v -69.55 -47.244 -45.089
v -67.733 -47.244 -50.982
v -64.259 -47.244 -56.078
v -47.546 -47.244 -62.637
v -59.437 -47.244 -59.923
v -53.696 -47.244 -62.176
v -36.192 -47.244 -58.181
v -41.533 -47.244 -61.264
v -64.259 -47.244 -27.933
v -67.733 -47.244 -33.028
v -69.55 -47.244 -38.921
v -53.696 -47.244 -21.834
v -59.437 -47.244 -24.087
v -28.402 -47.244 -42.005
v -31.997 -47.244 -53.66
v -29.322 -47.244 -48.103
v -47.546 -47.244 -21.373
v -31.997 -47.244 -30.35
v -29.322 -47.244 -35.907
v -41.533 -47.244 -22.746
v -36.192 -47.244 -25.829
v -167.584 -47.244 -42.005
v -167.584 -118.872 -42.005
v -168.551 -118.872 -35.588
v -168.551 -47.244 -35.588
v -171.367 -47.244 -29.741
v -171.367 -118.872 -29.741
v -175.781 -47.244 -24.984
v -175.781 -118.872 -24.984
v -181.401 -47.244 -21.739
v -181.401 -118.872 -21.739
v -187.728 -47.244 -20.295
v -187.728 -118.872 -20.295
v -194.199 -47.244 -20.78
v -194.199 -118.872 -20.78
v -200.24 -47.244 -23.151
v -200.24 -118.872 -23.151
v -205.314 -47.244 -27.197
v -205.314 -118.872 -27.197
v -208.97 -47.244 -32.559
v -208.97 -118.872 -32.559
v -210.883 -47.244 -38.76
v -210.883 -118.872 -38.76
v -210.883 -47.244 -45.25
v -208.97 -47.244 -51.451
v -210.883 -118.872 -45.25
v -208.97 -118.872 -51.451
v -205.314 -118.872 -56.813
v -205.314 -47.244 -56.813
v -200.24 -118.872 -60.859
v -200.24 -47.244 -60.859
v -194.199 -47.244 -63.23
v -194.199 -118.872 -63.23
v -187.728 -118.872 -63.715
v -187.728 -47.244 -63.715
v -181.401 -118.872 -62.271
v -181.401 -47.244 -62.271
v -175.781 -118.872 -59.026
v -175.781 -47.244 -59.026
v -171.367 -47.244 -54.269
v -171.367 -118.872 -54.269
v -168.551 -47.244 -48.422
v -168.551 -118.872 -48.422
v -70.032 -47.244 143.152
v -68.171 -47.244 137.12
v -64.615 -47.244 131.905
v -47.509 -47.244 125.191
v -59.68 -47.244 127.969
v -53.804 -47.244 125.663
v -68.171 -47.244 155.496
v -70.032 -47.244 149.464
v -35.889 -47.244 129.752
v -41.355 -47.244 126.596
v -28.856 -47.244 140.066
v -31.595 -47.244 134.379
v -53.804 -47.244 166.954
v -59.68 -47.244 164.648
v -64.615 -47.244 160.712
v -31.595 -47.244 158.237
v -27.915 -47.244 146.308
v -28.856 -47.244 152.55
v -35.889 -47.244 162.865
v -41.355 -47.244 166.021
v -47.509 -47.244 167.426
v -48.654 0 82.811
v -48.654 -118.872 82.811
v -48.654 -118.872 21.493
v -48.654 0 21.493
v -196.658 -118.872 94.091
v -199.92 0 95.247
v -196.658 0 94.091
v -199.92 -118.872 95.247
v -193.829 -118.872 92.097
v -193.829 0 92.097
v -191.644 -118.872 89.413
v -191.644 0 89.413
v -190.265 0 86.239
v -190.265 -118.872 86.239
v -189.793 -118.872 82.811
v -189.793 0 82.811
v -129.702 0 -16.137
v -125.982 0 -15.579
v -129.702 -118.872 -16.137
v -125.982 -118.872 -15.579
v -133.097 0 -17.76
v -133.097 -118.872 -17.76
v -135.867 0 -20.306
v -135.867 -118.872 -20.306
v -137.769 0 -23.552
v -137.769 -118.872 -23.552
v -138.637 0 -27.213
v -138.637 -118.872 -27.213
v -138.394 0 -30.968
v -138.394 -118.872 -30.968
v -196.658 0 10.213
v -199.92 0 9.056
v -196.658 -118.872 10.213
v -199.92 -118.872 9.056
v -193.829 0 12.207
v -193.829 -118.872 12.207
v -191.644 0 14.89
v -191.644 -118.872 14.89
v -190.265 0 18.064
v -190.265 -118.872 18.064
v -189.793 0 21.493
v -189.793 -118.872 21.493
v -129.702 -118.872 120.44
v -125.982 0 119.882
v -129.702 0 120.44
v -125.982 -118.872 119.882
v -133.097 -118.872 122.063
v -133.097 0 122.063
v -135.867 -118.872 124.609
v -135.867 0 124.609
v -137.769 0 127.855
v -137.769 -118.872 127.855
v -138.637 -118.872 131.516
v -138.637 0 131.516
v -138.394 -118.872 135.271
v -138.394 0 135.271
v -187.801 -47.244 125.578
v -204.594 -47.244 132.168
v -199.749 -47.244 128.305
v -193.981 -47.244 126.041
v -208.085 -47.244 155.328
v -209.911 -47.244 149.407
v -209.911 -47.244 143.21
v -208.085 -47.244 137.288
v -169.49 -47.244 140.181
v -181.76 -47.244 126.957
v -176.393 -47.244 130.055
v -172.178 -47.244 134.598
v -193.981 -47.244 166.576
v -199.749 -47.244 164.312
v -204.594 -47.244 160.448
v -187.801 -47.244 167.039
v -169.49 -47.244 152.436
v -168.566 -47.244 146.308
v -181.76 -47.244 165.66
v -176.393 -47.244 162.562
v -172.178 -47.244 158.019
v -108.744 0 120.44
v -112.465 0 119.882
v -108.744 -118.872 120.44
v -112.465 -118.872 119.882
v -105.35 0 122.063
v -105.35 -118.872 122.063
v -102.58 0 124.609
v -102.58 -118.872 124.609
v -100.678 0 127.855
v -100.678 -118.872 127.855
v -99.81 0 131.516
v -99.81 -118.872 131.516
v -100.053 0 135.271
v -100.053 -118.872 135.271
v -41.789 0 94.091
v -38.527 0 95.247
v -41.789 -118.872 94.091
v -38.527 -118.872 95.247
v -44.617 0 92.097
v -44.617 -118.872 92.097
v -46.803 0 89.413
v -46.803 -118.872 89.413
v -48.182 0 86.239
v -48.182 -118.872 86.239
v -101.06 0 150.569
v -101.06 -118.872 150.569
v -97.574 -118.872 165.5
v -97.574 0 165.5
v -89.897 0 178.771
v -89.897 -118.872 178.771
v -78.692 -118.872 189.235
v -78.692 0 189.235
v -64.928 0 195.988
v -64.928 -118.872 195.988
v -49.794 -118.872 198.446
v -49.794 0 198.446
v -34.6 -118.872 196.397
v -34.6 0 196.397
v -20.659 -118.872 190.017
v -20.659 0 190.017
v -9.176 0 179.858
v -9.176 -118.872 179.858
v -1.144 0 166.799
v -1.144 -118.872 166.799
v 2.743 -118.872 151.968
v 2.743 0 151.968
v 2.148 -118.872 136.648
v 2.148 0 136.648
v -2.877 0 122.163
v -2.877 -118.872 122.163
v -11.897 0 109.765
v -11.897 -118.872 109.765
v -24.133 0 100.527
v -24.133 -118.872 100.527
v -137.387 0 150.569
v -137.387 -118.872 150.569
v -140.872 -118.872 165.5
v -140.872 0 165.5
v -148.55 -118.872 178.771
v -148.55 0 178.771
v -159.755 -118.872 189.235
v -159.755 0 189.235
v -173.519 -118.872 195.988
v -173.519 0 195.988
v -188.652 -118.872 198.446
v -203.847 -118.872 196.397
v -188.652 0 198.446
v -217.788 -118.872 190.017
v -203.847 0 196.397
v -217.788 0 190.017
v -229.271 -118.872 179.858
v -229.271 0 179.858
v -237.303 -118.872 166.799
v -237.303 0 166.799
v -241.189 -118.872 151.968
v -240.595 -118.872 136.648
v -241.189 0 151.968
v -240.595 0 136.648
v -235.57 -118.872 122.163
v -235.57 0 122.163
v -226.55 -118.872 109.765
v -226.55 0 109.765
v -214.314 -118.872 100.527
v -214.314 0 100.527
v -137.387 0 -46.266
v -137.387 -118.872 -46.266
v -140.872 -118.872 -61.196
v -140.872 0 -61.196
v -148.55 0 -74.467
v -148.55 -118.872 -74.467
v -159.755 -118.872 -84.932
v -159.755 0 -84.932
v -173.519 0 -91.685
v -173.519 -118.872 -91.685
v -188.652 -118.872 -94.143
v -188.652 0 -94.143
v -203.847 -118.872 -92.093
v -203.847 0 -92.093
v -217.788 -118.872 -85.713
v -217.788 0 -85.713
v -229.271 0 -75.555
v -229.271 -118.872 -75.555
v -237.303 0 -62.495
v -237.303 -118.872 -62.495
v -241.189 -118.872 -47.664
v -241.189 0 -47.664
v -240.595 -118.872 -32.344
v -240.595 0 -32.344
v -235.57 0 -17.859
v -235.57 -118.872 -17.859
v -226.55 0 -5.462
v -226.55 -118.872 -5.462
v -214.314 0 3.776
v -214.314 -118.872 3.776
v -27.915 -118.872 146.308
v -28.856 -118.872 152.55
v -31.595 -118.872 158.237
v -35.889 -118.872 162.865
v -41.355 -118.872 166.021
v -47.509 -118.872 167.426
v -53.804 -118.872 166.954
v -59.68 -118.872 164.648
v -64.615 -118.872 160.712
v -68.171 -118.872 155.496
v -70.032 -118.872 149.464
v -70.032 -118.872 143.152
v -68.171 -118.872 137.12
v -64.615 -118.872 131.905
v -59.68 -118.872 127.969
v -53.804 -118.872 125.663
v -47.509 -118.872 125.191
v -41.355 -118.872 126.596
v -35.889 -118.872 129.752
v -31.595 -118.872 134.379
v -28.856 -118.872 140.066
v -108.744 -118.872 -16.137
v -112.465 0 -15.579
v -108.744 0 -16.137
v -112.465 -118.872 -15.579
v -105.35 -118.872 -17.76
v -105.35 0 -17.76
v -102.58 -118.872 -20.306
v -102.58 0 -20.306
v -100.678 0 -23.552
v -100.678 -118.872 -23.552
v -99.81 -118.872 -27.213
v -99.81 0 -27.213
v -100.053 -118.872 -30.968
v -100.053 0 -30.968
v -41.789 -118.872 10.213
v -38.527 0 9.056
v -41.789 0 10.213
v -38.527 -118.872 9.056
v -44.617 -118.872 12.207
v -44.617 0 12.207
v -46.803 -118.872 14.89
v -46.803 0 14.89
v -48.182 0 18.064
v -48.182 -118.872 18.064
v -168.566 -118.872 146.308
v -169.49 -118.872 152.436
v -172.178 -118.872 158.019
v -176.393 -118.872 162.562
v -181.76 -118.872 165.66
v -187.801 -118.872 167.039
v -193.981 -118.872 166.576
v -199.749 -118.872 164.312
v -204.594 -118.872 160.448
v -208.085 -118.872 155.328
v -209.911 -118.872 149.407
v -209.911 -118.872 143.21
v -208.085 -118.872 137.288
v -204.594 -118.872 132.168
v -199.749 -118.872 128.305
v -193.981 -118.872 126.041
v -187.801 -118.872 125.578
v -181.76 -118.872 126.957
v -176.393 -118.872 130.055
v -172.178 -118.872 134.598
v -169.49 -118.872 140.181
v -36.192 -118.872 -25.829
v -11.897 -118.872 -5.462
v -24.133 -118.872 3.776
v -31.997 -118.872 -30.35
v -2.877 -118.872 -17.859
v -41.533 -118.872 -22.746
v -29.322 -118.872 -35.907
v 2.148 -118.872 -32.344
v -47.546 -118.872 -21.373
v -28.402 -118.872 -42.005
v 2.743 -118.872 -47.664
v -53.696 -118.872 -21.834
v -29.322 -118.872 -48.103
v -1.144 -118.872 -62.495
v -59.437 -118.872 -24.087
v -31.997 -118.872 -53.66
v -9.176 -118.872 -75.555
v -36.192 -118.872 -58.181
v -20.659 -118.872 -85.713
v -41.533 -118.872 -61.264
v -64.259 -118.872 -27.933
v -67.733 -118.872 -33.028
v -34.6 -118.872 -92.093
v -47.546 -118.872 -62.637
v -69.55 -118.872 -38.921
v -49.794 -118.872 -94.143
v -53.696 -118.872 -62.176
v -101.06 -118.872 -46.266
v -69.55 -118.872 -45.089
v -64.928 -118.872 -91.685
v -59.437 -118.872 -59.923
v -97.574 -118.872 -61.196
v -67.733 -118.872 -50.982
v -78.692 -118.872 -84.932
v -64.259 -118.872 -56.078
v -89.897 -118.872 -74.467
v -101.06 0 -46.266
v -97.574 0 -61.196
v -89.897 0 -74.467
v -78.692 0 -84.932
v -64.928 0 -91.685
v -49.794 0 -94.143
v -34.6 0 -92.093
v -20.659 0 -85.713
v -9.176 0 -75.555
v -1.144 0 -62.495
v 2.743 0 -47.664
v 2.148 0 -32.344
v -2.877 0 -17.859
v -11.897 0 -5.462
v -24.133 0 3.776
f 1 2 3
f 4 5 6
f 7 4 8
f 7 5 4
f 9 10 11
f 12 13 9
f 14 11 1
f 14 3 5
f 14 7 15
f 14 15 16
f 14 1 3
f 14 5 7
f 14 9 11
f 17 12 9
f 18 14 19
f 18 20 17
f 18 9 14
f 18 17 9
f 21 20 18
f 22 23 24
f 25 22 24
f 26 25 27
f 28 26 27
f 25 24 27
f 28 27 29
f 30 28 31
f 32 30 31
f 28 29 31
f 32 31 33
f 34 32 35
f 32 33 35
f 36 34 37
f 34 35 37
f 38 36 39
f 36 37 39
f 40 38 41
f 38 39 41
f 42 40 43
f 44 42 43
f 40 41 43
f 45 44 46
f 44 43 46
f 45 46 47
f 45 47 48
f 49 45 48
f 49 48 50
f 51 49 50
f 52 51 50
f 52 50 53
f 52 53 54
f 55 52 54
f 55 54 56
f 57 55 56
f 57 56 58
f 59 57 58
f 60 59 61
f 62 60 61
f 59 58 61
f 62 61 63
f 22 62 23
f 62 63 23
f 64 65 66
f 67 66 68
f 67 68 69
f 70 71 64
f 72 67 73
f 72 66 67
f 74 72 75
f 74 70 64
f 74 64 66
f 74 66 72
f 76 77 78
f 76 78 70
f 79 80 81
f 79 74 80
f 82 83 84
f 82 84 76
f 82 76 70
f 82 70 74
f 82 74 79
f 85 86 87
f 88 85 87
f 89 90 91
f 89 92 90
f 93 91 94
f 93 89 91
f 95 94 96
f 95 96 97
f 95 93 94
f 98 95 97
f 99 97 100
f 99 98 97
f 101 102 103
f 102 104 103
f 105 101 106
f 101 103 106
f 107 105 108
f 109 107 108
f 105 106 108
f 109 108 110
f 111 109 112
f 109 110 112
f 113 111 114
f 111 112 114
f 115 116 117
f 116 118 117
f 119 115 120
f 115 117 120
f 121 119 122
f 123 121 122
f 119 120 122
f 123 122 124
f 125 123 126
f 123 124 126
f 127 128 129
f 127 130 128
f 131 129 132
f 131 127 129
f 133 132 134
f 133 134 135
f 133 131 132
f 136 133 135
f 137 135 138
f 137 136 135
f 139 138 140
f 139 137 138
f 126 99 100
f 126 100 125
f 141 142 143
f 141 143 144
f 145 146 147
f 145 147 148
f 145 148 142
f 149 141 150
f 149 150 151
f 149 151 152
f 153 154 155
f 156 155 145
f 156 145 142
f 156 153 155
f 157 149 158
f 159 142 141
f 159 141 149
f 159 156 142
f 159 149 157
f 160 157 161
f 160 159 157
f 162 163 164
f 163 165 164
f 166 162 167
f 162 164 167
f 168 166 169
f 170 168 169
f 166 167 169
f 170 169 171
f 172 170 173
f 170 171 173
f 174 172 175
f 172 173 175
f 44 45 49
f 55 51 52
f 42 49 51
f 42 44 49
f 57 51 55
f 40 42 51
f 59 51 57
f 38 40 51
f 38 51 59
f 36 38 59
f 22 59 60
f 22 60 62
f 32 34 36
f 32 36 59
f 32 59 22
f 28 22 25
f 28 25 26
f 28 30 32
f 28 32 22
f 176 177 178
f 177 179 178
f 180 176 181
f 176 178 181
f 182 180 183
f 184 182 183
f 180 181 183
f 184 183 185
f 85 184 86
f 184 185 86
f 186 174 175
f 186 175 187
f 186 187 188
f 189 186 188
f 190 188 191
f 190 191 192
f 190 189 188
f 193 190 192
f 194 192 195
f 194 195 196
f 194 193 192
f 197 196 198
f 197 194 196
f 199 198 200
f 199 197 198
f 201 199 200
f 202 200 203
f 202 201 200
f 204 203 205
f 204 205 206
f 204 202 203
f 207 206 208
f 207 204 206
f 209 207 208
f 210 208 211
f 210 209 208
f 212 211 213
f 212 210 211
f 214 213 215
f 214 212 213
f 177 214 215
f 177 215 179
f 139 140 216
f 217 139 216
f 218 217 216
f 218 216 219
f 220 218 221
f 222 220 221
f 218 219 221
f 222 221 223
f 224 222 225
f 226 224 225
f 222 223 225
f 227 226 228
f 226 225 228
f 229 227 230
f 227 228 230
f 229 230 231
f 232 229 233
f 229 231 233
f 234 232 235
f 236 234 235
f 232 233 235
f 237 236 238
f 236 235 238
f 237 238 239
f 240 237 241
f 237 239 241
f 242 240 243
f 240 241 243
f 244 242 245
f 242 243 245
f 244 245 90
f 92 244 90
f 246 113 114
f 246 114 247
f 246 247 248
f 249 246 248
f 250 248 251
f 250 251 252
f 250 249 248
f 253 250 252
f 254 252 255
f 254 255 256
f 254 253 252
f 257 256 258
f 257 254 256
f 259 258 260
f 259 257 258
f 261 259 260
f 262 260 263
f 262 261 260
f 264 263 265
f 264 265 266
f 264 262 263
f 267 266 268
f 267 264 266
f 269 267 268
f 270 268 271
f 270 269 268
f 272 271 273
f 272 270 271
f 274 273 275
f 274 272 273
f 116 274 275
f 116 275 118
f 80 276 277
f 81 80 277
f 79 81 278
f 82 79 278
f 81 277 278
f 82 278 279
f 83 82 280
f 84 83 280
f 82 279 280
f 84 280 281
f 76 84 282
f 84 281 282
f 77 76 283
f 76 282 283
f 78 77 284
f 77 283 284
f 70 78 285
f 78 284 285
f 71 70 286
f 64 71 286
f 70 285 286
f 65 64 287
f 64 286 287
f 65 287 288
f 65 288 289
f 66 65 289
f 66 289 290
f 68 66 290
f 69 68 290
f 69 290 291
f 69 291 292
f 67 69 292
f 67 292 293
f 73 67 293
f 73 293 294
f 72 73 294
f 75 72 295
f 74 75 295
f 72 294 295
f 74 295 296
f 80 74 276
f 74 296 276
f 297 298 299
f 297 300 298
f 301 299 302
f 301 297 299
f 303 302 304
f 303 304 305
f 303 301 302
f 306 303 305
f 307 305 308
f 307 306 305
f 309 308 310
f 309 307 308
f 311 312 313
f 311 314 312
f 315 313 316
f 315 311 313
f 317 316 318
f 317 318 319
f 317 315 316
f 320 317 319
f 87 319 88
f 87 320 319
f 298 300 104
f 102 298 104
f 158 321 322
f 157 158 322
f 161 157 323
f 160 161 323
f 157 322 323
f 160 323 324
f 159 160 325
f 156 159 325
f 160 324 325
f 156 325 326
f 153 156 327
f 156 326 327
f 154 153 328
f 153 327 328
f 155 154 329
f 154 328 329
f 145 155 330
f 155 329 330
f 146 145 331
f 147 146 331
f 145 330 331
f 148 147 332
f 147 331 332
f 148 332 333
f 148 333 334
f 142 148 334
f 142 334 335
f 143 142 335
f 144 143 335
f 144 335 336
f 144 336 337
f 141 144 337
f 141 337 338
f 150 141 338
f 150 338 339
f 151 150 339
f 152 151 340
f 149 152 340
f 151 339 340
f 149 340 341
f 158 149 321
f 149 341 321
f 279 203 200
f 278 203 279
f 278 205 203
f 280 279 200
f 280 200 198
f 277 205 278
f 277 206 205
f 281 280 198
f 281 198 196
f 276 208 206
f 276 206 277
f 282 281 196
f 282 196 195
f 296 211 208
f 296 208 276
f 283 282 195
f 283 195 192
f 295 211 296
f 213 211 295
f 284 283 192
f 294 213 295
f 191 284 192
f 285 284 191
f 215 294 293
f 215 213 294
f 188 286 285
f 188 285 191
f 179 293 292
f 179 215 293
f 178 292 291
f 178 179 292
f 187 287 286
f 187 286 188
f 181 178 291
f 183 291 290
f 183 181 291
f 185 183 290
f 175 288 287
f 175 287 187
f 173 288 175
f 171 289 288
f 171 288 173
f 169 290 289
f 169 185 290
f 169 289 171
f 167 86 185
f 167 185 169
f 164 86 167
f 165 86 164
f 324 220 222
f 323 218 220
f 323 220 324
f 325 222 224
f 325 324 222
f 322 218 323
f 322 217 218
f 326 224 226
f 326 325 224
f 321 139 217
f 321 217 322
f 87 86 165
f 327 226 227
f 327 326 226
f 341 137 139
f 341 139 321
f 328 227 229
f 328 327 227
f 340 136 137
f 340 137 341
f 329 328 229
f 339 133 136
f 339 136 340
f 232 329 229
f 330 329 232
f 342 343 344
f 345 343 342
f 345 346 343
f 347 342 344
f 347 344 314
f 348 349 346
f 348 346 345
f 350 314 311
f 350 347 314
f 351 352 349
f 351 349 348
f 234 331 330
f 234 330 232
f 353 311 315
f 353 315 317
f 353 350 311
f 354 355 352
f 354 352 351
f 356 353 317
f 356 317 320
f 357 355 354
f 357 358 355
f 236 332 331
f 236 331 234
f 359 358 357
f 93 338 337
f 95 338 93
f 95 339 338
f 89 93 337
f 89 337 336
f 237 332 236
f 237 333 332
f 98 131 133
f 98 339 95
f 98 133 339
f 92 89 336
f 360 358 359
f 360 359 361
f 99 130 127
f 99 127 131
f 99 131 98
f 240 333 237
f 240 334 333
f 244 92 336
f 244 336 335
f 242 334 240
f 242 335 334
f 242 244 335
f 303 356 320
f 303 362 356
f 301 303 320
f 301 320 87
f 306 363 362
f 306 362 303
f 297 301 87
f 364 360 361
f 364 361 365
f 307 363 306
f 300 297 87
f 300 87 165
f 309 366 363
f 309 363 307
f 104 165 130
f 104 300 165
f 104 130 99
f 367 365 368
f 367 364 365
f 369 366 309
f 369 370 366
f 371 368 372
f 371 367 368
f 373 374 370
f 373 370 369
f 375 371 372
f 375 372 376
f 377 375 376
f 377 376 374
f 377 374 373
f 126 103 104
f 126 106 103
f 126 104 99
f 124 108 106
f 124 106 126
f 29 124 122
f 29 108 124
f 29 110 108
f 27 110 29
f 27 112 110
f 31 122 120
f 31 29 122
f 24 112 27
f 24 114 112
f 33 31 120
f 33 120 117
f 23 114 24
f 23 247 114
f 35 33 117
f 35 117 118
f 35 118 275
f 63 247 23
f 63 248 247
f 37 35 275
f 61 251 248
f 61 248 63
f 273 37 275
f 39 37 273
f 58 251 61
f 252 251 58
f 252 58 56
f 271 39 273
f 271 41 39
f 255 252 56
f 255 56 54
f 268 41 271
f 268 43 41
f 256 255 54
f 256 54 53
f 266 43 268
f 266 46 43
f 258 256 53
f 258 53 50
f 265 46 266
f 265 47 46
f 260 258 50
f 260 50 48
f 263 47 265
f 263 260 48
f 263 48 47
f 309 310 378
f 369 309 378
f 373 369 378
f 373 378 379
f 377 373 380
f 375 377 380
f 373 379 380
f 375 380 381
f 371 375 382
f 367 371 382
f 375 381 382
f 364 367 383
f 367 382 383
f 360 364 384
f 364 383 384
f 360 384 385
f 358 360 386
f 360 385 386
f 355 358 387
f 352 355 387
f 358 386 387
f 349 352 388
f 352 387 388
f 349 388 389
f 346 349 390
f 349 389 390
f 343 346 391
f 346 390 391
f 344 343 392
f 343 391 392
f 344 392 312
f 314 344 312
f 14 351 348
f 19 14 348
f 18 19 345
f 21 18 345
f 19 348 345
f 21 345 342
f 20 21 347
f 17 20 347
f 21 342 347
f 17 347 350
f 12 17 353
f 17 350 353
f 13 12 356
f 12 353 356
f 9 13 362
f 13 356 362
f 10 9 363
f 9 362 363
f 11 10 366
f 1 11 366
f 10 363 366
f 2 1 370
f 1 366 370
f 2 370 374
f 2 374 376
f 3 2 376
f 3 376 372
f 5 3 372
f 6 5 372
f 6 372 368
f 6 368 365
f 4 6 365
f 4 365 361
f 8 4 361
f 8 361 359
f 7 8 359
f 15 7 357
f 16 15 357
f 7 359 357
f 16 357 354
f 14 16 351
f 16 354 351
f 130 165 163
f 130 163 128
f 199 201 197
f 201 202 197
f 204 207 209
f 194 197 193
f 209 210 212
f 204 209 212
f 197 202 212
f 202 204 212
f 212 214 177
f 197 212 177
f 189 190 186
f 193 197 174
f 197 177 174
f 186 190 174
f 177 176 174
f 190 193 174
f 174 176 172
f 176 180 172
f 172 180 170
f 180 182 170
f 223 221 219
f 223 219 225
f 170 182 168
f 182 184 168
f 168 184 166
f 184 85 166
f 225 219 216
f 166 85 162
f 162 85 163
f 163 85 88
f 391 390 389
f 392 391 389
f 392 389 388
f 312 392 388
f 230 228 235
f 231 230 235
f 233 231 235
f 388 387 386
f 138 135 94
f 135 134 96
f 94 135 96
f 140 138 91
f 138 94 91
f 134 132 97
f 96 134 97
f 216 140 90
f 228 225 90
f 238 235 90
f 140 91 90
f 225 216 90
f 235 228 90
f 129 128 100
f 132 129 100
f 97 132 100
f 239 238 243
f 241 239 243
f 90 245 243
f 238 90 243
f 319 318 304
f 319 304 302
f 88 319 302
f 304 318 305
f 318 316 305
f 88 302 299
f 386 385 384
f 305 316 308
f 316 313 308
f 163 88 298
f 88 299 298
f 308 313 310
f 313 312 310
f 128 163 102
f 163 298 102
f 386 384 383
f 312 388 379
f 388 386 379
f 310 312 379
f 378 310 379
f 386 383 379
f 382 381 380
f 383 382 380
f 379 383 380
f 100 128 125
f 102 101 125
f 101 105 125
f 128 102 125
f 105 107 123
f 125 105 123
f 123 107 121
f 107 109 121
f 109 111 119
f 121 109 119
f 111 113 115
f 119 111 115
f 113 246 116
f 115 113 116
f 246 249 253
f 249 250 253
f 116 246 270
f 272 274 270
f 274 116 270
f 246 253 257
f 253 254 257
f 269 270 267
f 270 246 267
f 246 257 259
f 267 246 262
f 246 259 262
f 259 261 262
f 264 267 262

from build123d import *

# Parameters (mm, degrees)
F1_DEPTH = 118.872
F2_R     = 12.7
F5_R     = 20.788829
F5_R_2   = 21.17652
F5_R_3   = 20.68959
F5_R_4   = 21.770913
F6_DEPTH = 71.628


with BuildPart() as f1:
    # F0 (on Front) → F1 (new body)
    with BuildSketch(Plane.XZ):
        with BuildLine():
            Line((-48.653666, 52.151624), (-119.223386, 52.151624))
            Line((-119.223386, 52.151624), (-119.223386, -15.579229))
            Line((-119.223386, -15.579229), (-94.042334, -15.579229))
            ThreePointArc((-94.042334, -15.579229), (-23.388954, -87.372558), (-48.653666, 10.135782))
            Line((-48.653666, 10.135782), (-48.653666, 52.151624))
        make_face()
    extrude(amount=F1_DEPTH)

    # F2
    f2_edges = [f1.edges().sort_by_distance(p)[0] for p in [
        (-94.042334, -59.436, -15.579229),
        (-48.653666, -59.436, 10.135782),
    ]]
    fillet(f2_edges, radius=F2_R)

    # F3: F1 across face


with BuildPart() as f1_1:
    add(f1.part)
    add(f1.part.mirror(Plane(origin=(-119.223386, -59.436, 18.286197), x_dir=(0, -1, 0), z_dir=(-1, 0, 0))))

    # F4: F1 across face


with BuildPart() as f1_2:
    add(f1_1.part)
    add(f1_1.part.mirror(Plane(origin=(-119.223386, -59.436, 52.151624), x_dir=(1, 0, 0), z_dir=(0, 0, 1))))

    # F5 (on face) → F6 (cut)
    with BuildSketch(Plane.XZ.offset(118.872)):
        with Locations((-189.354789, 146.308288)):
            Circle(F5_R)
        with Locations((-49.091984, 146.308288)):
            Circle(F5_R_2)
        with Locations((-49.091984, -42.00504)):
            Circle(F5_R_3)
        with Locations((-189.354789, -42.00504)):
            Circle(F5_R_4)
    extrude(amount=-F6_DEPTH, mode=Mode.SUBTRACT)


solid = f1_2.part
